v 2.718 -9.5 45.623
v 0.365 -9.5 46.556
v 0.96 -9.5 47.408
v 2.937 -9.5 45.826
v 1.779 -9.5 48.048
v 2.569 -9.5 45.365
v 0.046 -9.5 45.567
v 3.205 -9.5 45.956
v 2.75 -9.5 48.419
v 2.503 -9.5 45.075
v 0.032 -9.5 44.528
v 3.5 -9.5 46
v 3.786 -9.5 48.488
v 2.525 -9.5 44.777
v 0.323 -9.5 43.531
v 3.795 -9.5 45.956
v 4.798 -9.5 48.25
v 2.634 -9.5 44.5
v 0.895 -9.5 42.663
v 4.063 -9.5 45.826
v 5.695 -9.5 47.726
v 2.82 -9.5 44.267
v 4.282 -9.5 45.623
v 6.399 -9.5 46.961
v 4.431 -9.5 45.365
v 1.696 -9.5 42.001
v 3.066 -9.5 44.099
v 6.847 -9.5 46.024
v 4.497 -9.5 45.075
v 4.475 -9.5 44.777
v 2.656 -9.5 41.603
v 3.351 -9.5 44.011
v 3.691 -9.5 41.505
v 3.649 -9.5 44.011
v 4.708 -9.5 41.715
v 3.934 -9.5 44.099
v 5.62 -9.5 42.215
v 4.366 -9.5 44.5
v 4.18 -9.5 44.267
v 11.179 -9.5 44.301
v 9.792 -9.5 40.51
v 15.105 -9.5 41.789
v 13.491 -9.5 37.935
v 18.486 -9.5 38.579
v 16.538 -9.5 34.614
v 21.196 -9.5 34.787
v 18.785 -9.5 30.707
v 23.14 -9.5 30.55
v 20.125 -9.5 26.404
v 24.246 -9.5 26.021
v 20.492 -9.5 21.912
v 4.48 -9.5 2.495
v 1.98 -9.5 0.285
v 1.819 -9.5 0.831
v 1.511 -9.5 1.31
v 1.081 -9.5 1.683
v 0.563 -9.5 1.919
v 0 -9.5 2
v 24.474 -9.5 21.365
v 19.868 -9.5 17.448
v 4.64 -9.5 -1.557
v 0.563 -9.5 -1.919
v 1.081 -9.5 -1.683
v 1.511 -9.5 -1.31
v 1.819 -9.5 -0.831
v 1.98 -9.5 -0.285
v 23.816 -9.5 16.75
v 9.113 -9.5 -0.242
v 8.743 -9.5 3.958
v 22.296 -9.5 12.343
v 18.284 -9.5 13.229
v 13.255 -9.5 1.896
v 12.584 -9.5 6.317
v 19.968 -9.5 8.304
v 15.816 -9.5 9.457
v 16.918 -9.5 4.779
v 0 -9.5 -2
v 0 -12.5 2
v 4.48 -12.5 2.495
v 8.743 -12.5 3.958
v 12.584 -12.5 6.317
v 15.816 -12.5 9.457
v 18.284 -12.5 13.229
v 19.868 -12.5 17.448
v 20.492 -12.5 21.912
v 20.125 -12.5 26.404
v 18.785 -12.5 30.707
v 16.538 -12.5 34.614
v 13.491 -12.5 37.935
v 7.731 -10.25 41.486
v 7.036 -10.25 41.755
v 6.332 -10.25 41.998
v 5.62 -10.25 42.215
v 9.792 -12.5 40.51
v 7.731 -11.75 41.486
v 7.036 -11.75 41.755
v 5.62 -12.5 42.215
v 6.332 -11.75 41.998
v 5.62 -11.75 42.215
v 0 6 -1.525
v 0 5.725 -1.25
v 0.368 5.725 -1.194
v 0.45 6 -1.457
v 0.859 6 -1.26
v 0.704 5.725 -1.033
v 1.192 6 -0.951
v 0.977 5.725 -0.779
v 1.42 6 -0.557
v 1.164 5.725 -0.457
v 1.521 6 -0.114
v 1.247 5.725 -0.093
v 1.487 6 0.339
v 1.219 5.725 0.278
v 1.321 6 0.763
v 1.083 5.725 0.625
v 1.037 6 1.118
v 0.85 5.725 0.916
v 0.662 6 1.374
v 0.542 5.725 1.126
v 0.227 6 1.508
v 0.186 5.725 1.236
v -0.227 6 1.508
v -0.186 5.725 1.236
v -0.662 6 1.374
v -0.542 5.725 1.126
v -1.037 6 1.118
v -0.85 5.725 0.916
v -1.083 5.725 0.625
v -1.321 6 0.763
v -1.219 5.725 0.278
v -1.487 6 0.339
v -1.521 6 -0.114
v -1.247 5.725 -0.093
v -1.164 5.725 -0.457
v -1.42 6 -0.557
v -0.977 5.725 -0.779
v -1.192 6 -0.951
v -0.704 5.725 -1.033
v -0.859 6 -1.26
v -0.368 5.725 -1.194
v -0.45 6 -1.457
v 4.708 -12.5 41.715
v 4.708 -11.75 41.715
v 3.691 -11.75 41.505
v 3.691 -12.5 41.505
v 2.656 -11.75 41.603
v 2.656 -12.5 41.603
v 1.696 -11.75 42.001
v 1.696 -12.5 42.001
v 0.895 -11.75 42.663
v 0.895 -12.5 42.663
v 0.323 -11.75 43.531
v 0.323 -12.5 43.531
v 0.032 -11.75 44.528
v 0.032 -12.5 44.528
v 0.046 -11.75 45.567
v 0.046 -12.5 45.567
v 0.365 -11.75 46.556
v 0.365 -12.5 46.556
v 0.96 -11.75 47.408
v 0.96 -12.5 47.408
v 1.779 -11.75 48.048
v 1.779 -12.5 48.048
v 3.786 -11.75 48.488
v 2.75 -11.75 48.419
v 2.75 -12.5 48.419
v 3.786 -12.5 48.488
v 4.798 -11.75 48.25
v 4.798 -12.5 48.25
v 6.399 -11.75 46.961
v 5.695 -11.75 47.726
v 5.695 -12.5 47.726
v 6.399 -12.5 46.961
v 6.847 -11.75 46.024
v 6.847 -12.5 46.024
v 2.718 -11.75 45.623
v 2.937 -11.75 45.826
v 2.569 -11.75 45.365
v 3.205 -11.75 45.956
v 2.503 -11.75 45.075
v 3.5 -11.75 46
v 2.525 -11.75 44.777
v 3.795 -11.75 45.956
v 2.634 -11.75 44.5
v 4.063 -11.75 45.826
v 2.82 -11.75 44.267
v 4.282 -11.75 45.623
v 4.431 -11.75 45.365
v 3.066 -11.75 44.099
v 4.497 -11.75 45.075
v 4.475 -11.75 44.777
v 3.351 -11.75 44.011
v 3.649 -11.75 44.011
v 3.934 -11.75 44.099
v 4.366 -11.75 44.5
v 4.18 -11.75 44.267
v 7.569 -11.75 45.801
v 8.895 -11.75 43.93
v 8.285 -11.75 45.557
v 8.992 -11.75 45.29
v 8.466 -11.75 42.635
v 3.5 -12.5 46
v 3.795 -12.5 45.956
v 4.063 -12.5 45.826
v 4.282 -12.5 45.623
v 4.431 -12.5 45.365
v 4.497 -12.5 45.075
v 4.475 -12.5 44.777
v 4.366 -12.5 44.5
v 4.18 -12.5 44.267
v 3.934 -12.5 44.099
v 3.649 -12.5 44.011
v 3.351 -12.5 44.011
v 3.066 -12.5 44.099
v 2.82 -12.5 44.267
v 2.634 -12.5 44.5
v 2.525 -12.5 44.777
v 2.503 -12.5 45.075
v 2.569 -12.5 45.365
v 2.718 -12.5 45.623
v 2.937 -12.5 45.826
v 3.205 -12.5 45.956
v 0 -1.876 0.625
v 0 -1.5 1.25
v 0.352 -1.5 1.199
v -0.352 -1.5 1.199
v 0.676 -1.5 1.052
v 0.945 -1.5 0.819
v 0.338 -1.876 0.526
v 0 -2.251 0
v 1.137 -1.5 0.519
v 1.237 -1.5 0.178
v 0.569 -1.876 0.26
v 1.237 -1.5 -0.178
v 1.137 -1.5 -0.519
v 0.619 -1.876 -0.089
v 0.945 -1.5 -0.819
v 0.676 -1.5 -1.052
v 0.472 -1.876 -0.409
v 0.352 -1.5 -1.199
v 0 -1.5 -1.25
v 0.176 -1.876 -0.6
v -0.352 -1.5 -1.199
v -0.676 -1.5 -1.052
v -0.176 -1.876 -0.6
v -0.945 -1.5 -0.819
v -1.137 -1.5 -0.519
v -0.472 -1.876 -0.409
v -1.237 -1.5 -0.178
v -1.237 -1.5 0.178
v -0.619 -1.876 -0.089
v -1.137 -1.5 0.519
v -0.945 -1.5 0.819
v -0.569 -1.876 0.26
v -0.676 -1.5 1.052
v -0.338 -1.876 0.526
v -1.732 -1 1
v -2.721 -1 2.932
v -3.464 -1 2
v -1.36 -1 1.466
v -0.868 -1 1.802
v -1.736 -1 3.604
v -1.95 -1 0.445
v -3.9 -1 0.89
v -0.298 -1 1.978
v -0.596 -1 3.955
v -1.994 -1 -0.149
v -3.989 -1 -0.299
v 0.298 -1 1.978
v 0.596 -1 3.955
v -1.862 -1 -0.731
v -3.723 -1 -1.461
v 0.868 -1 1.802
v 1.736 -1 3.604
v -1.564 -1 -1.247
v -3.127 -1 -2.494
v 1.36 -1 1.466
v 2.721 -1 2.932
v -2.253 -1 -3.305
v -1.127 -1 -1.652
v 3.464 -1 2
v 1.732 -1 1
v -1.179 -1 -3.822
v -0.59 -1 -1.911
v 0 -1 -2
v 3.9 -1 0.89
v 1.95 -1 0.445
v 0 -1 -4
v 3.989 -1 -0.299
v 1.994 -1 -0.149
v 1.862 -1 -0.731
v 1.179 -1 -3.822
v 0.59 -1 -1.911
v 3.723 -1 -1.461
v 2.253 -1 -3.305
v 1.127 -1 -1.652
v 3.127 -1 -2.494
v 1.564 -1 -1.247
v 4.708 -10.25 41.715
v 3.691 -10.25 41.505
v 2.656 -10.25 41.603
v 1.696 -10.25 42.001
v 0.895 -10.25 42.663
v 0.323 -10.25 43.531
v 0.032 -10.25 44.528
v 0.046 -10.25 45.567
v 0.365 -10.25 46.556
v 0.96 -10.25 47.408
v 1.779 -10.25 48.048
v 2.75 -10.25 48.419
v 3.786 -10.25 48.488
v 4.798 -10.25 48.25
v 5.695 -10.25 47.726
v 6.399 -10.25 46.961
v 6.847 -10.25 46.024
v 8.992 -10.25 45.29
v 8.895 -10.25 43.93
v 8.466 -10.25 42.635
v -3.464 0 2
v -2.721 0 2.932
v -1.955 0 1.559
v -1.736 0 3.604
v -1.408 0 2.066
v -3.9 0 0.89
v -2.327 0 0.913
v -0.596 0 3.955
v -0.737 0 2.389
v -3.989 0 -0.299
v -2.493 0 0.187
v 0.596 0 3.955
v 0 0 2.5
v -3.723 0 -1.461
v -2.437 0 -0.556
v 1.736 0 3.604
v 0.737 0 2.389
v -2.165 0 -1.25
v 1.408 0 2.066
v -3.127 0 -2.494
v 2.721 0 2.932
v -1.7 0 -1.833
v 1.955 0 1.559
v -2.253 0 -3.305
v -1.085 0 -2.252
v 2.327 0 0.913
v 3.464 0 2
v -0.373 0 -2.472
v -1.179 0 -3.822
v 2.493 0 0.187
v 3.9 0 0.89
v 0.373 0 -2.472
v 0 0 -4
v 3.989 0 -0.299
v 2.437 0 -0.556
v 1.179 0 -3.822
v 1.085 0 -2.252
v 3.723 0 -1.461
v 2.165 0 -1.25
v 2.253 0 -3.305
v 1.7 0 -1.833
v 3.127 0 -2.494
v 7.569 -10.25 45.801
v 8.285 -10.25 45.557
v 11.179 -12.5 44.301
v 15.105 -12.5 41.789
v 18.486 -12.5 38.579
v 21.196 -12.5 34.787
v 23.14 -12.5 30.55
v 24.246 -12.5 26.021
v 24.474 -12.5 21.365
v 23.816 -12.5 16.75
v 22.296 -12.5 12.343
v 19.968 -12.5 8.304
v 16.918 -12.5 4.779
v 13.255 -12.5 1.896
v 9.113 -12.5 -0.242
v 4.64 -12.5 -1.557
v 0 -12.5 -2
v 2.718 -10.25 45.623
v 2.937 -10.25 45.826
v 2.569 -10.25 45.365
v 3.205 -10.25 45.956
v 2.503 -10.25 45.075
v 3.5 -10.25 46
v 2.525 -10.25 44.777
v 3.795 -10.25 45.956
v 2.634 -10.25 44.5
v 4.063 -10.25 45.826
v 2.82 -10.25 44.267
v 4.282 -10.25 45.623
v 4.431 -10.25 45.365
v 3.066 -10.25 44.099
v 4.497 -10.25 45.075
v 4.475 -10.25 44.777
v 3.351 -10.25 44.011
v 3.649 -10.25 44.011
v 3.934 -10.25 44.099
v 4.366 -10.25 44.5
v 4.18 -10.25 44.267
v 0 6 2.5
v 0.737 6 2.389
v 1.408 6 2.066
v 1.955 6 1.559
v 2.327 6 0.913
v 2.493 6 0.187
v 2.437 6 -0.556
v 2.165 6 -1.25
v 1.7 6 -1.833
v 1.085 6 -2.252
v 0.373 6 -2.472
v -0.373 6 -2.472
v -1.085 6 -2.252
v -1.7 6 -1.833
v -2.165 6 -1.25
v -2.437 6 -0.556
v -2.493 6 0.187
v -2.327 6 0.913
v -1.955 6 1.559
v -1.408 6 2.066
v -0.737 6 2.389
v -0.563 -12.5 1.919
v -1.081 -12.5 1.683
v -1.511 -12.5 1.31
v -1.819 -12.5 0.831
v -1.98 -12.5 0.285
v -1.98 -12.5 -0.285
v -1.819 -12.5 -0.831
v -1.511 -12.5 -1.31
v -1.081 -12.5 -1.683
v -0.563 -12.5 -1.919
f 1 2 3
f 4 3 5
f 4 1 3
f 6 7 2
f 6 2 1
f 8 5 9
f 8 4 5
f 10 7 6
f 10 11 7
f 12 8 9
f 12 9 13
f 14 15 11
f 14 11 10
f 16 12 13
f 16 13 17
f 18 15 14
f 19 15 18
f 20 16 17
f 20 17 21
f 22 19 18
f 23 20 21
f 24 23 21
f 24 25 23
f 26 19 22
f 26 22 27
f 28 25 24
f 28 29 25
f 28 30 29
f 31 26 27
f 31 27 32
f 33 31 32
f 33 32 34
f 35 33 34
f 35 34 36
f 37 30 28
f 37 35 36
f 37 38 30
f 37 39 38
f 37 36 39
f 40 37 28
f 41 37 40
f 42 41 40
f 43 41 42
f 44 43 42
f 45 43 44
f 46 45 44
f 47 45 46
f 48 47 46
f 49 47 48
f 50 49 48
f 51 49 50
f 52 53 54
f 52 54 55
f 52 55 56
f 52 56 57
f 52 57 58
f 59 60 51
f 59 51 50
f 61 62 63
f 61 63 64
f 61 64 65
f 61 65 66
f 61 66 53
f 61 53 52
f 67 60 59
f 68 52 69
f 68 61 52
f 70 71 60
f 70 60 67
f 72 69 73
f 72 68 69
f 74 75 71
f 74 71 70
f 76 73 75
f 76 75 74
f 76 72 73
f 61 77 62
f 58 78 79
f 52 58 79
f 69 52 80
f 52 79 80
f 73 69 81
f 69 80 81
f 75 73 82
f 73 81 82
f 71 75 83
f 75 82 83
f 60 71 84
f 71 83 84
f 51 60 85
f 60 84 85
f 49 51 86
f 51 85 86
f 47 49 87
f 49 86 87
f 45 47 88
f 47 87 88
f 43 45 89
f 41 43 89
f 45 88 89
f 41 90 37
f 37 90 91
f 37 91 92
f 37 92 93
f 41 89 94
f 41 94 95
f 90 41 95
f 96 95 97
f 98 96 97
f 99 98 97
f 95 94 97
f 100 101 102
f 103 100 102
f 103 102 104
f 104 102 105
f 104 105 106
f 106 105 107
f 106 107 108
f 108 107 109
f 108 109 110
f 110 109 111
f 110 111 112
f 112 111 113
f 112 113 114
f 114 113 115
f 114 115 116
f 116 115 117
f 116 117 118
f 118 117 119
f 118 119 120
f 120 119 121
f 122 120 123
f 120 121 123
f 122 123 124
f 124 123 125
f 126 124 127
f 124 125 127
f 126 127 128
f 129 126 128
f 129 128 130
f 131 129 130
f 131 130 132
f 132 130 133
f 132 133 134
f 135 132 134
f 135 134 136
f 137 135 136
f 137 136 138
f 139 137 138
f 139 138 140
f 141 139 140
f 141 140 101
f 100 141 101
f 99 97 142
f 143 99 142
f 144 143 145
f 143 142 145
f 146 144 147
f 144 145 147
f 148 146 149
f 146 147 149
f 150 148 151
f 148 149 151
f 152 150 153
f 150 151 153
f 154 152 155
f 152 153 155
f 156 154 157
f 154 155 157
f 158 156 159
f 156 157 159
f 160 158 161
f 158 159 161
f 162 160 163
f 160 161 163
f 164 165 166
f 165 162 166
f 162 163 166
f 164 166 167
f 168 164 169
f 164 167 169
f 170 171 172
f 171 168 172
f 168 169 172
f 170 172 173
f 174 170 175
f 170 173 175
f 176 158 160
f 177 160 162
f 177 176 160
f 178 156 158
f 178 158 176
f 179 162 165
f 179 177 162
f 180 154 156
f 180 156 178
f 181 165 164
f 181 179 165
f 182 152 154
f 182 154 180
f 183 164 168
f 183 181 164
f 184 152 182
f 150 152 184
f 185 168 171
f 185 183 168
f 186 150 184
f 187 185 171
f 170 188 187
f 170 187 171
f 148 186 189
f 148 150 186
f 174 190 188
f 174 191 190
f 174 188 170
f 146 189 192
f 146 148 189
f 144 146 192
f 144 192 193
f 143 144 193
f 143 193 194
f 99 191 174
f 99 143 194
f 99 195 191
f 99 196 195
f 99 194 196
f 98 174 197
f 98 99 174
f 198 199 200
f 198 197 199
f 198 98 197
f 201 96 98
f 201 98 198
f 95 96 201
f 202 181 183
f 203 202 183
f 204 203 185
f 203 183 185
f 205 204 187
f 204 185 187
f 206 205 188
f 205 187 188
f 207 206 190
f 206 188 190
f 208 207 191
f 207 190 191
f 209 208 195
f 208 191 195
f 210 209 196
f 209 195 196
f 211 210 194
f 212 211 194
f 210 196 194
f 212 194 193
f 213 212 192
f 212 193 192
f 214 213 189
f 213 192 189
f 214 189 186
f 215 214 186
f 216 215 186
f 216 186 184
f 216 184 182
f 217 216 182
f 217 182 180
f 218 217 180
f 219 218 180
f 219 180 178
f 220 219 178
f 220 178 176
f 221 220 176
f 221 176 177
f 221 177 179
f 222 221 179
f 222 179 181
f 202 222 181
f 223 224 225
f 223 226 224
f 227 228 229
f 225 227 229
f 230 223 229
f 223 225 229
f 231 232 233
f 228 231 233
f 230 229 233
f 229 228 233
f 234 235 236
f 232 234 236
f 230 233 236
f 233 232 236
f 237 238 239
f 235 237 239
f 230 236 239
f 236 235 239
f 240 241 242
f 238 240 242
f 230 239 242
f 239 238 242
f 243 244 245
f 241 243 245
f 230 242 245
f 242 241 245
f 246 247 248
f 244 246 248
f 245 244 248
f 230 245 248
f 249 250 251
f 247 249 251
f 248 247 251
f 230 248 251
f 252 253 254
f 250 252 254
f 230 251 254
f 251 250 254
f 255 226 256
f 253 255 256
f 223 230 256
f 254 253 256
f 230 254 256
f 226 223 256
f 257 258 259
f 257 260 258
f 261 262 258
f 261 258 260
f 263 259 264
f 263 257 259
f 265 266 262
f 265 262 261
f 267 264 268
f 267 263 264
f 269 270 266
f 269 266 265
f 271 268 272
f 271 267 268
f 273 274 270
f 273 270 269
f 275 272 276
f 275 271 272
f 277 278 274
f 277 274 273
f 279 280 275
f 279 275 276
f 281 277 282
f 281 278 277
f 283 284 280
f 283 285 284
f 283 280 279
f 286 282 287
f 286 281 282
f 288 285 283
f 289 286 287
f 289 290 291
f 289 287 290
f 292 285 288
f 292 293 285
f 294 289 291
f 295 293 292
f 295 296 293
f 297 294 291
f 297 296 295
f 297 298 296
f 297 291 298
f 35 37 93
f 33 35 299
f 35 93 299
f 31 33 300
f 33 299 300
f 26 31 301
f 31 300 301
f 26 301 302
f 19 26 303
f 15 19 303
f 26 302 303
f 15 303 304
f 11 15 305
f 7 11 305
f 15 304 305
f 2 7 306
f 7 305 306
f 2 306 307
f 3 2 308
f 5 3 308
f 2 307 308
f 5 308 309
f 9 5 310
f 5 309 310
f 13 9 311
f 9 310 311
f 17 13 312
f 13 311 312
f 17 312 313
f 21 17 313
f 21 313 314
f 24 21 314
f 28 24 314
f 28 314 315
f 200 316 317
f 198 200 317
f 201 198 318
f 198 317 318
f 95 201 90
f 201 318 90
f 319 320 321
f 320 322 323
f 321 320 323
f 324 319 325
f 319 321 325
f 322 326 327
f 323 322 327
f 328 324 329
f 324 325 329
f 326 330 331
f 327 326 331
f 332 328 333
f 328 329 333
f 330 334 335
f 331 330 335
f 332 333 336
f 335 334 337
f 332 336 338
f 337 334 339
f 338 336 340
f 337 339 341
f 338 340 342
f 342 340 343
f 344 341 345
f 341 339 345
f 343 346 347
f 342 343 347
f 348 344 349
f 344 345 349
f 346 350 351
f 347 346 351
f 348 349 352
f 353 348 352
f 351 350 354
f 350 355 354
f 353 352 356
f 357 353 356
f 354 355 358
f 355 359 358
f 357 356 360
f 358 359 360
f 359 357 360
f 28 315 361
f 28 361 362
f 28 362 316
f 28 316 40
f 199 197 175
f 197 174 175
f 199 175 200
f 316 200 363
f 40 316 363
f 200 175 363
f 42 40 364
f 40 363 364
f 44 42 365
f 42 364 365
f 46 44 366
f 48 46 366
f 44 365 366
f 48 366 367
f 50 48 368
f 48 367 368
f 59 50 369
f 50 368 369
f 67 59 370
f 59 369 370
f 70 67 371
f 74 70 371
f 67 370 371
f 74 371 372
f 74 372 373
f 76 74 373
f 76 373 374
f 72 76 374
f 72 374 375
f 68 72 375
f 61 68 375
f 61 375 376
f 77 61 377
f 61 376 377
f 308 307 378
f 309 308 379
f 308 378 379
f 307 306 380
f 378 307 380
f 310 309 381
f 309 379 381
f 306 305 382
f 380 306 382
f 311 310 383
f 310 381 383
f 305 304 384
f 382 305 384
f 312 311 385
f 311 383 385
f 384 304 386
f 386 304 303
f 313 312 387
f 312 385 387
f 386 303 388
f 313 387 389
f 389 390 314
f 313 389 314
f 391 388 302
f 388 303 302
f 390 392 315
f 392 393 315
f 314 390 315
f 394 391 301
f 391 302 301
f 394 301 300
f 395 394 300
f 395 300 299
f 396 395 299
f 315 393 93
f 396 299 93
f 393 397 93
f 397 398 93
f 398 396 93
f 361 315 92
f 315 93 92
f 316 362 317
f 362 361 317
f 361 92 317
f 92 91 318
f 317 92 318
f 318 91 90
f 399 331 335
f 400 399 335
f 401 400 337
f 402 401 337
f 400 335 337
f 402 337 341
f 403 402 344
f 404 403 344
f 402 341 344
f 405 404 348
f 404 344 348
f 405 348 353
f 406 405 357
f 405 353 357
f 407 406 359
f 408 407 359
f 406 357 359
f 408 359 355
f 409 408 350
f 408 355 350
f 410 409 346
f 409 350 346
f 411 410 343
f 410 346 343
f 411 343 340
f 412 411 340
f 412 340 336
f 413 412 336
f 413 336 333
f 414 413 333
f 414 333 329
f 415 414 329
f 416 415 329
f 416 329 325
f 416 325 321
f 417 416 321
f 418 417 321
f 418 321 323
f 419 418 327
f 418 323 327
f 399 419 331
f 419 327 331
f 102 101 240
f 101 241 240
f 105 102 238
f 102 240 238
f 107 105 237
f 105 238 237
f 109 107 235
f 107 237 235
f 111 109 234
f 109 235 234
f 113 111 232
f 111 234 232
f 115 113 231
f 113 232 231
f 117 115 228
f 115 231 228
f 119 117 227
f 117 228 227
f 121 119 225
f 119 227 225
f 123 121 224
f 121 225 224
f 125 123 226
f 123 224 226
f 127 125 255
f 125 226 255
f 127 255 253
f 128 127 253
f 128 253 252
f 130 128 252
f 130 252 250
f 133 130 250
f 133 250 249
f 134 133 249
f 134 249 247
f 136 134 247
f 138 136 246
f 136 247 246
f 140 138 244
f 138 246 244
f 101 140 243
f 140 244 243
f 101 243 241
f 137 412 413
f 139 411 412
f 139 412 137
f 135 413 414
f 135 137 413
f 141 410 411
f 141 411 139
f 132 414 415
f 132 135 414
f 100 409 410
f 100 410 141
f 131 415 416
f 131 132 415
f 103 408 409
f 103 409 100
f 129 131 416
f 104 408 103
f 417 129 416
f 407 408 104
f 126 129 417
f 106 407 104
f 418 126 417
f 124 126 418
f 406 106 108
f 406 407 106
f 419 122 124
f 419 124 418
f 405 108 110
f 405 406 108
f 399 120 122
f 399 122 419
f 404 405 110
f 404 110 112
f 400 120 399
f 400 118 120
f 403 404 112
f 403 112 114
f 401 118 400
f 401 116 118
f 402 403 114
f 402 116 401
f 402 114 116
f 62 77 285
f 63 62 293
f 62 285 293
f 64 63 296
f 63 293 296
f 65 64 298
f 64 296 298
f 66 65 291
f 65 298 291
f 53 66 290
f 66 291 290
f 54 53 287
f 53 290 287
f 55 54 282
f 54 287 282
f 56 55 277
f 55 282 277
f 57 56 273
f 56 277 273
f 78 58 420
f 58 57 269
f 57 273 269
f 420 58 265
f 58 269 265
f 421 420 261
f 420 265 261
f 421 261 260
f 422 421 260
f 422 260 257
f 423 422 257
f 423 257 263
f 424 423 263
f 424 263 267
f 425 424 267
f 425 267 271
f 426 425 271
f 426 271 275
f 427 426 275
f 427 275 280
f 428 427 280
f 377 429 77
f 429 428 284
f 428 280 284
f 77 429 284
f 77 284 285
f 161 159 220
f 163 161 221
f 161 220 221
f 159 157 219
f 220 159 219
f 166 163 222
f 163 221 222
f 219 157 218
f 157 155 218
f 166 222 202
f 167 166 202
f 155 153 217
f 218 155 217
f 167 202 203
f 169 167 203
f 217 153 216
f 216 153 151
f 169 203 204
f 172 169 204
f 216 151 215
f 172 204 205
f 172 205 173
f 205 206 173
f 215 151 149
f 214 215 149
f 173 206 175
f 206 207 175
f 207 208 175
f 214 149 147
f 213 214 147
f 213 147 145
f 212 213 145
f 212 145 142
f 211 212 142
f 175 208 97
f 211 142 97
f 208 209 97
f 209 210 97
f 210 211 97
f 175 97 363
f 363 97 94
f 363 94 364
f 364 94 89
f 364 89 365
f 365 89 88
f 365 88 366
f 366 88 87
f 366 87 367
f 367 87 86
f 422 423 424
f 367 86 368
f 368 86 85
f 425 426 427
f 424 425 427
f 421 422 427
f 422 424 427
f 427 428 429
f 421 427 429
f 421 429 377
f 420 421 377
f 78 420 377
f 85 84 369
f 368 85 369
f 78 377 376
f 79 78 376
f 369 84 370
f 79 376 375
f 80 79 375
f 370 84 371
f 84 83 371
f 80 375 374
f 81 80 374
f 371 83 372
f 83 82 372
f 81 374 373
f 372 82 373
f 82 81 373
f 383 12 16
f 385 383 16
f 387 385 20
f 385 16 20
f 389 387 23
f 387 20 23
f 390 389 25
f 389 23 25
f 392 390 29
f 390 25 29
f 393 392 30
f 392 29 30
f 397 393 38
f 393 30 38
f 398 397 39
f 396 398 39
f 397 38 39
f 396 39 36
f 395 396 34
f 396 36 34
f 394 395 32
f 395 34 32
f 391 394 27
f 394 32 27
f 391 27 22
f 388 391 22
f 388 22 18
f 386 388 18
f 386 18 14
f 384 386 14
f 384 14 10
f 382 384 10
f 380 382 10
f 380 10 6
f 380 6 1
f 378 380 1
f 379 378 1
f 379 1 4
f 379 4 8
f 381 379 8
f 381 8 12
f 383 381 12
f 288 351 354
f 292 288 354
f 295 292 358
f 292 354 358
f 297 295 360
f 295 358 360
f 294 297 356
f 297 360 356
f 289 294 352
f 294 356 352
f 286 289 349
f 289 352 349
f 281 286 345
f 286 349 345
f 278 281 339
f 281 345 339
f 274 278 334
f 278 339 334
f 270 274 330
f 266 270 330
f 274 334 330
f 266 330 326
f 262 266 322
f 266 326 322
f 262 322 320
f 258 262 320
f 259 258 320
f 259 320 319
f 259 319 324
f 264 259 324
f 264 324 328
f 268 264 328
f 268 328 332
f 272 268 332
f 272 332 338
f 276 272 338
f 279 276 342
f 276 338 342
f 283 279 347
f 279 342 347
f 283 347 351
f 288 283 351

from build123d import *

# Parameters (mm, degrees)
SKETCH1_R                   = 2.5
BOSS_EXTRUDE1_DEPTH         = 6
SKETCH2_R                   = 4
BOSS_EXTRUDE2_DEPTH         = 1
BOSS_EXTRUDE3_DEPTH         = 1.5
SKETCH7_R                   = 2
BOSS_EXTRUDE4_DEPTH         = 8.5
SKETCH8_R                   = 5.5
CUT_EXTRUDE1_DEPTH          = 0.75
SKETCH9_R                   = 1
CUT_EXTRUDE2_DEPTH          = 57.504424606
M3_TAPPED_HOLE2_D           = 2.5
M3_TAPPED_HOLE2_DEPTH       = 7.5
M3_TAPPED_HOLE2_CSINK_D     = 3.05
M3_TAPPED_HOLE2_CSINK_ANGLE = 90
M3_TAPPED_HOLE2_TIP         = 0.751075774


with BuildPart() as part:
    # Sketch1 → Boss-Extrude1 (new body)
    with BuildSketch(Plane(origin=(0, 0, 0), x_dir=(1, 0, 0), z_dir=(0, 1, 0))):
        with Locations(Location((0, 0, 0), (0, 0, 270))):
            Circle(SKETCH1_R)
    extrude(amount=BOSS_EXTRUDE1_DEPTH)

    # Sketch2 → Boss-Extrude2 (add)
    with BuildSketch(Plane.XZ):
        with Locations(Location((0, 0, 0), (0, 0, 270))):
            Circle(SKETCH2_R)
    extrude(amount=BOSS_EXTRUDE2_DEPTH)



with BuildPart() as body_2:
    # Sketch6 → Boss-Extrude3 (new, symmetric)
    with BuildSketch(Plane(origin=(0, -11, 0), x_dir=(-1, 0, 0), z_dir=(0, -1, 0))):
        with BuildLine():
            ThreePointArc((-5.619513954, -42.214742274), (-0.168678351, -46.073450543), (-6.84690974, -46.02381404))
            ThreePointArc((-6.84690974, -46.02381404), (-24.254725766, -19.04192568), (0, 2))
            ThreePointArc((0, 2), (2, 0), (0, -2))
            ThreePointArc((0, -2), (-20.302736473, -19.662943128), (-5.619513954, -42.214742274))
        make_face()
    extrude(amount=BOSS_EXTRUDE3_DEPTH, both=True)


with BuildPart() as part_1:
    add(part.part)

    add(body_2.part)  # Boss-Extrude4 merges body 2
    # Sketch7 → Boss-Extrude4 (add)
    with BuildSketch(Plane.XZ.offset(1)):
        with Locations(Location((0, 0, 0), (0, 0, 270))):
            Circle(SKETCH7_R)
    extrude(amount=BOSS_EXTRUDE4_DEPTH)

    # Sketch8 → Cut-Extrude1 (cut, symmetric)
    with BuildSketch(Plane(origin=(0, -11, 0), x_dir=(1, 0, 0), z_dir=(0, 1, 0))):
        with Locations((3.5, -45)):
            Circle(SKETCH8_R)
    extrude(amount=CUT_EXTRUDE1_DEPTH, both=True, mode=Mode.SUBTRACT)

    # Sketch9 → Cut-Extrude2 (cut, through all)
    with BuildSketch(Plane(origin=(0, -9.5, 0), x_dir=(1, 0, 0), z_dir=(0, 1, 0))):
        with Locations(Location((3.5, -45, 0), (0, 0, 270))):
            Circle(SKETCH9_R)
    extrude(amount=-CUT_EXTRUDE2_DEPTH, mode=Mode.SUBTRACT)

    # M3 Tapped Hole2
    with Locations(Plane.ZX.offset(6)):
        with Locations((0, 0)):
            CounterSinkHole(M3_TAPPED_HOLE2_D / 2, M3_TAPPED_HOLE2_CSINK_D / 2, depth=M3_TAPPED_HOLE2_DEPTH, counter_sink_angle=M3_TAPPED_HOLE2_CSINK_ANGLE)
            with Locations((0, 0, -(M3_TAPPED_HOLE2_DEPTH + M3_TAPPED_HOLE2_TIP / 2))):  # 118° drill point
                Cone(0, M3_TAPPED_HOLE2_D / 2, M3_TAPPED_HOLE2_TIP, mode=Mode.SUBTRACT)


solid = part_1.part
